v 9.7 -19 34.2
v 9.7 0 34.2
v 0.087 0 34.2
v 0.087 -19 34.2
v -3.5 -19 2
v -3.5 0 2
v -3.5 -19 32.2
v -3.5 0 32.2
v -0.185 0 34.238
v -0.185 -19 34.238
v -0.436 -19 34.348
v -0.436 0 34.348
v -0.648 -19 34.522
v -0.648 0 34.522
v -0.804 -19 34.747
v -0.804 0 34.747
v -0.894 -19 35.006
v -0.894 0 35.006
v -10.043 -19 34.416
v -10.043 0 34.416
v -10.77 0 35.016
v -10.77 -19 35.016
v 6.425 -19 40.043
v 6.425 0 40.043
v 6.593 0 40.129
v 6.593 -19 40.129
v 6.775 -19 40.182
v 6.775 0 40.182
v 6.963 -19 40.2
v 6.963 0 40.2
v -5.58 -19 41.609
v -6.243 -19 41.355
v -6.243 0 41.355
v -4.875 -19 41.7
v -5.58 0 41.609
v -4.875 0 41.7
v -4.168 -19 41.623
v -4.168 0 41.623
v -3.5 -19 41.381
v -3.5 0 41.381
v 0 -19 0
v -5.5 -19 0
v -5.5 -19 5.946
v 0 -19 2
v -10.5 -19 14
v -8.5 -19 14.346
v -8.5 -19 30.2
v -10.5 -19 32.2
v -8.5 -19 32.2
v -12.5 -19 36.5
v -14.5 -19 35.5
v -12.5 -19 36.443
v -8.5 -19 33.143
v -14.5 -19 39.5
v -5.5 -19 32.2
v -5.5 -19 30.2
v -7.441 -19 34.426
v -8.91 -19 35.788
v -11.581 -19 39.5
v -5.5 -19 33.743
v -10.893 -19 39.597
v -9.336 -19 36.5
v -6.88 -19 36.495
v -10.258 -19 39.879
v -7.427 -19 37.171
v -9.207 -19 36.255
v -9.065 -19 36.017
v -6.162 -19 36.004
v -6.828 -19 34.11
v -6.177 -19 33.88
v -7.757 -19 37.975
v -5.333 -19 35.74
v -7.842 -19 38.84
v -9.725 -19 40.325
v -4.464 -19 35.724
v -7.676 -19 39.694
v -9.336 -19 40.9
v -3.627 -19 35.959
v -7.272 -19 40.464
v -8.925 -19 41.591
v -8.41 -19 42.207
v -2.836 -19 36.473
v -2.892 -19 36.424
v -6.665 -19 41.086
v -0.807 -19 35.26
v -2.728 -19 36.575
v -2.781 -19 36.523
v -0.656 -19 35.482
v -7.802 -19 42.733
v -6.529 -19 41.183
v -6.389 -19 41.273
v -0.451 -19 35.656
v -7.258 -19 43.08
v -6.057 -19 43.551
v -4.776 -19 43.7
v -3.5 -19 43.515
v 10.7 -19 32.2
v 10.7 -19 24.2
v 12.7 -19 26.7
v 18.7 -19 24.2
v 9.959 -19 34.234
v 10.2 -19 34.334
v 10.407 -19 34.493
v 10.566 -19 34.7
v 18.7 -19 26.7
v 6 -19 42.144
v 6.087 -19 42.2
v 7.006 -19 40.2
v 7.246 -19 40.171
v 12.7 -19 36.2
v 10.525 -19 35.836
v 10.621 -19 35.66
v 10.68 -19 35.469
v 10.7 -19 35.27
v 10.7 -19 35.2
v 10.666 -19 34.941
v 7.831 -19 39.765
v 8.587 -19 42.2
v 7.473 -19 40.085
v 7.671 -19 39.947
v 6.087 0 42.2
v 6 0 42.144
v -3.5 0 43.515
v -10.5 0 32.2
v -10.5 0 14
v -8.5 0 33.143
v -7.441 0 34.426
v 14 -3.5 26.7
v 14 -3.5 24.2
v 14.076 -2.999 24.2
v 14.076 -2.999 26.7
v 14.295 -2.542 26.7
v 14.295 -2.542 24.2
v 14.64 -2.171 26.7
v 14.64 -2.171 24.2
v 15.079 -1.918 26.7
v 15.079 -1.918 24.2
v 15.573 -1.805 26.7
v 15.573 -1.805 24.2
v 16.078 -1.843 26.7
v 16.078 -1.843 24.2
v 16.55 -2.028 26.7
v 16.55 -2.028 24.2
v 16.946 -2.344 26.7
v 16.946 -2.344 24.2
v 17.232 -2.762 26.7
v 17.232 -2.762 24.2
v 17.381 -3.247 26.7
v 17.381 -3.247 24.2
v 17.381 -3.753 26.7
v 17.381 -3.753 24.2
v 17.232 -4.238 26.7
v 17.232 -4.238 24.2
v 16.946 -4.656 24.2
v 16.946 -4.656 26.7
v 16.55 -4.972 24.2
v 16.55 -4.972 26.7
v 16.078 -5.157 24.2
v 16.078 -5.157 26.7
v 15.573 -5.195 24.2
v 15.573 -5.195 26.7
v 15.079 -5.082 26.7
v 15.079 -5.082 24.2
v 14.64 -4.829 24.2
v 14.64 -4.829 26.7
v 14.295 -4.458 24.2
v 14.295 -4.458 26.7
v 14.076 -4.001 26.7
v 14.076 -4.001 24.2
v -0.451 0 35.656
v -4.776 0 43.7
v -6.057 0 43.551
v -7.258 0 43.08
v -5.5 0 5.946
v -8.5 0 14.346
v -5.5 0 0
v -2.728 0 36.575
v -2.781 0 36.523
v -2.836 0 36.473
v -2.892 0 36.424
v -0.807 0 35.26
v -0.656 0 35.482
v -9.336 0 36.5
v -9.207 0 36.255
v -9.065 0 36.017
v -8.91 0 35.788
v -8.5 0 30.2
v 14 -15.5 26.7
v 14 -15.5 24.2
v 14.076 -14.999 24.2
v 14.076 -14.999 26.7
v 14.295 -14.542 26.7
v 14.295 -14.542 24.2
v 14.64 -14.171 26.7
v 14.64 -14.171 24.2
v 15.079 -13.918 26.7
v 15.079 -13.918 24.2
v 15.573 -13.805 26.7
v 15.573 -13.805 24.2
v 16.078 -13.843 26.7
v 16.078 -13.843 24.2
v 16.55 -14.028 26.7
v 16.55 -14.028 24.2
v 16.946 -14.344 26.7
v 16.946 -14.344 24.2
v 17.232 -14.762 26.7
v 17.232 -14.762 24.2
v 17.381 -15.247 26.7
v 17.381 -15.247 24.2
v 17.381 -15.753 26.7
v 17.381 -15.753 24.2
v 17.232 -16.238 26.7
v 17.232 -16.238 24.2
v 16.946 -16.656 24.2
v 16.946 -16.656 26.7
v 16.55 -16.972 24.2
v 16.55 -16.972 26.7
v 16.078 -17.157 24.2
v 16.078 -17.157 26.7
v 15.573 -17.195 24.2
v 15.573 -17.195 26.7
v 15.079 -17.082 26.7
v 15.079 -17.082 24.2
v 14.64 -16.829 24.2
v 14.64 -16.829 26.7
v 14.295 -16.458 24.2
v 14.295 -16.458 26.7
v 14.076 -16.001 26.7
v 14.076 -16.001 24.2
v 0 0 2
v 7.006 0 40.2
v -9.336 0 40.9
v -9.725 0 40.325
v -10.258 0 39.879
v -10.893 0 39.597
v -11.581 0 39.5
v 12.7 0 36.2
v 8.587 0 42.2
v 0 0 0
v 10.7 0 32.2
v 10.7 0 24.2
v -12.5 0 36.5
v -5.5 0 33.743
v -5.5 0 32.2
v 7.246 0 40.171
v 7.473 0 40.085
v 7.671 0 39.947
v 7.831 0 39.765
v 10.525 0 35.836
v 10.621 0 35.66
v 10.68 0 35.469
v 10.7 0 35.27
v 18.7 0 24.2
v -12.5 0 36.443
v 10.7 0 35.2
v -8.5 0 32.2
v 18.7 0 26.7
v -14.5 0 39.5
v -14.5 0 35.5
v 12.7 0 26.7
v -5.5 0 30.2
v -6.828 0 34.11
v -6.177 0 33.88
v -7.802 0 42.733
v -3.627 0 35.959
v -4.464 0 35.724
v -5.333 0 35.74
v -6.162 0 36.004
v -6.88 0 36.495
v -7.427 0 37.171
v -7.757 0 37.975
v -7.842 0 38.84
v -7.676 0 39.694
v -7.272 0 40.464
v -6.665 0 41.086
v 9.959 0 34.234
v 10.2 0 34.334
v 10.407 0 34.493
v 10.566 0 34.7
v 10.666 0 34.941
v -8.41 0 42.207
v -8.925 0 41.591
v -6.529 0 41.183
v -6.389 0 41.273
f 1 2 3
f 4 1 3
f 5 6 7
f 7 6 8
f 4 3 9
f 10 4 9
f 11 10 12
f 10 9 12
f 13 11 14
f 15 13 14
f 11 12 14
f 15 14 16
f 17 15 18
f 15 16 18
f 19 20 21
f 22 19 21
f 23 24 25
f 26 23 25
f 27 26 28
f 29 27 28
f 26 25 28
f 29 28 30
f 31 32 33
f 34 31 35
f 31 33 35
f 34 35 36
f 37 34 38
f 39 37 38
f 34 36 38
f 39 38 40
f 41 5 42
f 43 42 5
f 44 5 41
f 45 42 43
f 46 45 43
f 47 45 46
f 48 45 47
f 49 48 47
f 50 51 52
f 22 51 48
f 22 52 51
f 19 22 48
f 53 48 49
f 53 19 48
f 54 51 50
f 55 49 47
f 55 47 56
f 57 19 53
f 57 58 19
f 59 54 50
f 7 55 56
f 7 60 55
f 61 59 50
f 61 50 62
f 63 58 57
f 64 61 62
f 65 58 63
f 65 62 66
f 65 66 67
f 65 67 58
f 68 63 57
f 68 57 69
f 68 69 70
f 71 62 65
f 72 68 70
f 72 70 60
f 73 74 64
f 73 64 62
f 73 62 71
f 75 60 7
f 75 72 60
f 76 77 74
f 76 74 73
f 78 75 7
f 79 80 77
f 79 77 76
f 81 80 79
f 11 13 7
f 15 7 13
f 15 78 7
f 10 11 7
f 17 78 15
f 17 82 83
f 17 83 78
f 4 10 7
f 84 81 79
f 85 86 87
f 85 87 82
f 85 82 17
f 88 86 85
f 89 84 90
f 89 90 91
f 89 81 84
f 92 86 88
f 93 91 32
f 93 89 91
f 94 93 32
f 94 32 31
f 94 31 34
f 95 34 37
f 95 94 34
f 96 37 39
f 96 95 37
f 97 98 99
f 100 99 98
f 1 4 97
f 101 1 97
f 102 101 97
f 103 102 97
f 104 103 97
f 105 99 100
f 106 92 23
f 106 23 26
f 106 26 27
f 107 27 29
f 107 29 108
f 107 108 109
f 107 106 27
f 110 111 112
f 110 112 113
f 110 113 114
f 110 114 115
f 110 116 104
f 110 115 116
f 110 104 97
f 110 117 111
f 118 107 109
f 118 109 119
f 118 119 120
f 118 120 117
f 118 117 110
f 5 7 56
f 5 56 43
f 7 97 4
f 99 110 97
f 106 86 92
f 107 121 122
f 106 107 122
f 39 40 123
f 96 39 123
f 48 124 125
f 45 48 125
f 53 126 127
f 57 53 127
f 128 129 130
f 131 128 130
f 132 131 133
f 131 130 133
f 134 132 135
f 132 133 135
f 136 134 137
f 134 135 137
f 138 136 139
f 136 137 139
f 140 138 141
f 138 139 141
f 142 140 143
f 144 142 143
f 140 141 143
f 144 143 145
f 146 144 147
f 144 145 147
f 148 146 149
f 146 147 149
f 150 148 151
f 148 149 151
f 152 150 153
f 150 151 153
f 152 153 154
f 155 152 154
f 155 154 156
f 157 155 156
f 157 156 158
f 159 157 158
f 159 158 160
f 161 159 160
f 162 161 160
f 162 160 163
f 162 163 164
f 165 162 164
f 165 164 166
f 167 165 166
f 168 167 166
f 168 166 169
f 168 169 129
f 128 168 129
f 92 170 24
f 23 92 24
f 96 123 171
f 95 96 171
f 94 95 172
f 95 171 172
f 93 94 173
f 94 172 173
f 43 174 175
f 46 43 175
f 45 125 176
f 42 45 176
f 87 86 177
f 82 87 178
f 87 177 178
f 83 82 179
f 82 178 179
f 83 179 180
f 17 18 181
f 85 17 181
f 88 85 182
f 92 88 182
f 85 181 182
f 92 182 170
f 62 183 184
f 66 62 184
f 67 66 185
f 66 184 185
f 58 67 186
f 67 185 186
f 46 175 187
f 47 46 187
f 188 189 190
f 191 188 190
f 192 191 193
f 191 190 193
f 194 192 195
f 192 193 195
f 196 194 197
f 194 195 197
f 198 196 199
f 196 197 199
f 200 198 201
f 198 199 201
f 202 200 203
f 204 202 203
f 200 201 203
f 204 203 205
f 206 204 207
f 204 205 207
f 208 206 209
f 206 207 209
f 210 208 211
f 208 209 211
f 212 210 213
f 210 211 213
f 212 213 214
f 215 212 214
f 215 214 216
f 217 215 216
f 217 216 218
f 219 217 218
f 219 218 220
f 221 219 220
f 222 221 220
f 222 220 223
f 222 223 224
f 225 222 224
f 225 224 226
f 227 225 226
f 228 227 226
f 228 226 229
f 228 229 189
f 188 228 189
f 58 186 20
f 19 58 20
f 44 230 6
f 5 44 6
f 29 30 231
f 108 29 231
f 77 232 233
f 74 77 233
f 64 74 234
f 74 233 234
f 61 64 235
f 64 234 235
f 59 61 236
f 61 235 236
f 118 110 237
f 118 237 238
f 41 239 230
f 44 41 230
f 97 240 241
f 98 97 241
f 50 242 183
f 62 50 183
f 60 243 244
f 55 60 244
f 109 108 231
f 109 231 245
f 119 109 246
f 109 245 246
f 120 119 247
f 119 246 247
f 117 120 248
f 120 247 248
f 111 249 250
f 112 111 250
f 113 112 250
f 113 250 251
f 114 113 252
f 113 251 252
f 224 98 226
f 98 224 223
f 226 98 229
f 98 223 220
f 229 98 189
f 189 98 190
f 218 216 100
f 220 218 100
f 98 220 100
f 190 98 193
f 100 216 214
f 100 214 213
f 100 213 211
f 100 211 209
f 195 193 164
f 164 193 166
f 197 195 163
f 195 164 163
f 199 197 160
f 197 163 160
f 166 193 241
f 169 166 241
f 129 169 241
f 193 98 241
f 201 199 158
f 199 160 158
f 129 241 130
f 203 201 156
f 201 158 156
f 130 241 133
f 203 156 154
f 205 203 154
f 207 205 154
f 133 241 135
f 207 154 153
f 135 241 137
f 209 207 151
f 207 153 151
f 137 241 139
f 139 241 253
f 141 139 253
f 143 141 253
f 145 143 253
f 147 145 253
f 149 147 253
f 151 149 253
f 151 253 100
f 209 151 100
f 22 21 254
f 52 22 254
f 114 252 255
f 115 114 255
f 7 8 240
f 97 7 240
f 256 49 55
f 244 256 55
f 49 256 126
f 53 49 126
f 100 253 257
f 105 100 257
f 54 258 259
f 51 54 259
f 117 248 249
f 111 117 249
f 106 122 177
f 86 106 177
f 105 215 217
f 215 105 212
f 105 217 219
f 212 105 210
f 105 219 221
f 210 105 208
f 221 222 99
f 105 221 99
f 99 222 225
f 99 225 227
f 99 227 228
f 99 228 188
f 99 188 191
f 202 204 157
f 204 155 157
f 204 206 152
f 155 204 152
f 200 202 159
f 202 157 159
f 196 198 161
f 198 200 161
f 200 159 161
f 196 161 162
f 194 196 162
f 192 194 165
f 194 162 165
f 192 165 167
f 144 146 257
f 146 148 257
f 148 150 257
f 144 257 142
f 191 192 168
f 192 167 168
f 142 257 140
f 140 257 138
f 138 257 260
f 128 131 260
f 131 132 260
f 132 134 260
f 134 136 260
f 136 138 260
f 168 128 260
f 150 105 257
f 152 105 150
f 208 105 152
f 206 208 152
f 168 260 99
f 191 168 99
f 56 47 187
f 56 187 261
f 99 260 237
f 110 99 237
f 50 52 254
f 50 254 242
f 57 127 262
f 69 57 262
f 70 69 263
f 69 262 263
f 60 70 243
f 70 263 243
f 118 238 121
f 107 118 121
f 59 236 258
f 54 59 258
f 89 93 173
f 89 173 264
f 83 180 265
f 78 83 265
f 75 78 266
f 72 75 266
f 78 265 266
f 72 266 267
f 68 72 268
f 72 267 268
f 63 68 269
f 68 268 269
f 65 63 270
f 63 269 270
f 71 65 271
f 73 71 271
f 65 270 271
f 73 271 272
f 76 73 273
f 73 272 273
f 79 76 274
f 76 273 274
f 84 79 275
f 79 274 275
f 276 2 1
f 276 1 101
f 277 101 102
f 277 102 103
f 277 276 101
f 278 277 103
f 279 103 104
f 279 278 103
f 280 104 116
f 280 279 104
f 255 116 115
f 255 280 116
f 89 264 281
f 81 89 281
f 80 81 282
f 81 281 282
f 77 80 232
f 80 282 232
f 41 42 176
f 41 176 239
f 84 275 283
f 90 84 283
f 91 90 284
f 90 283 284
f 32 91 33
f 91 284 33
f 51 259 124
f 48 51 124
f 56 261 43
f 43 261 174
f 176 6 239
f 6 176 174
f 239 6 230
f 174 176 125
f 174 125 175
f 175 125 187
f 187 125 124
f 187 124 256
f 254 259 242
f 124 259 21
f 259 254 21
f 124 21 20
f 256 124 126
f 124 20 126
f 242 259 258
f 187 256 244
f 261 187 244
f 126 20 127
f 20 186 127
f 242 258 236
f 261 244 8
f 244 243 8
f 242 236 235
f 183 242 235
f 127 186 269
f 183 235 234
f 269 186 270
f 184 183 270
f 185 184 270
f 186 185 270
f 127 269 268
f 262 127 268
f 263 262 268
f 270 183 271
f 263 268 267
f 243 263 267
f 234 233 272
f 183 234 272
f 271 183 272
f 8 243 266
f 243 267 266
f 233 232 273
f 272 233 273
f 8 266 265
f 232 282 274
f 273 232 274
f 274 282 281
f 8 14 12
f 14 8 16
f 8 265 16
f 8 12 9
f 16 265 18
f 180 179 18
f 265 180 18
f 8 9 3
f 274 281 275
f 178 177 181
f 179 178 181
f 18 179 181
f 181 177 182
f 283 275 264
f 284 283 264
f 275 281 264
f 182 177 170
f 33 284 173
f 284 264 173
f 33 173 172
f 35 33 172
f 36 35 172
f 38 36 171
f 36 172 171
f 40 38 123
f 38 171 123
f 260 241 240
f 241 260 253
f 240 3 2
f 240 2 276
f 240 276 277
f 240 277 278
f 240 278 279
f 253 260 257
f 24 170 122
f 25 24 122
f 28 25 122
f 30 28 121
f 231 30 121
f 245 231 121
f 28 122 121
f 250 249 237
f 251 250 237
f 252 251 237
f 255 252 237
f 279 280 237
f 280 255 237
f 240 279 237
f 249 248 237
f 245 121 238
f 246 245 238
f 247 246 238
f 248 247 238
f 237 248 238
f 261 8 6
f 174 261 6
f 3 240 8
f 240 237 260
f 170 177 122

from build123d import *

# Parameters (mm, degrees)
F0_W        = 3
F0_H        = 2
F1_DEPTH    = 19
F3_D        = 3.4
F4_T1_DEPTH = 19


# Not quite as in the source:
# - a fillet or chamfer that OpenCascade refuses, or shapes differently, is made with other operations: its cross-section is extruded or revolved along the edge and cut away or added


with BuildPart() as f1:
    # F0 (on Front) → F1 (new body)
    with BuildSketch(Plane.XZ):
        with Locations((-7, 31.2)):
            Rectangle(F0_W, F0_H)
        with BuildLine():
            Line((-10.0427465571, 34.4155443421), (-8.5, 33.1427784325))
            Line((-8.5, 33.1427784325), (-7.441074238, 34.4263248107))
            ThreePointArc((-7.441074238, 34.4263248107), (-8.244619139, 35.032889635), (-8.9103596286, 35.7881345584))
            Line((-8.9103596286, 35.7881345584), (-10.0427465571, 34.4155443421))
        make_face()
        with BuildLine():
            Line((-10.5, 14), (-5.5, 0))
            Line((-5.5, 0), (-5.5, 5.9464274989))
            Line((-5.5, 5.9464274989), (-8.5, 14.3464274989))
            Line((-8.5, 14.3464274989), (-8.5, 30.2))
            Line((-8.5, 30.2), (-8.5, 32.2))
            Line((-8.5, 32.2), (-8.5, 33.1427784325))
            Line((-8.5, 33.1427784325), (-10.0427465571, 34.4155443421))
            Line((-10.0427465571, 34.4155443421), (-10.7699806475, 35.0155124667))
            Line((-10.7699806475, 35.0155124667), (-12.5, 36.4427784325))
            Line((-12.5, 36.4427784325), (-12.5, 36.5))
            Line((-12.5, 36.5), (-9.3357403136, 36.5))
            ThreePointArc((-9.3357403136, 36.5), (-9.7907115521, 37.9601557031), (-9.7830217401, 39.4895328221))
            ThreePointArc((-9.7830217401, 39.4895328221), (-9.7333018776, 39.7544433664), (-9.6693788597, 40.0162897125))
            ThreePointArc((-9.6693788597, 40.0162897125), (-9.5234750406, 40.4660413374), (-9.3357403136, 40.9))
            ThreePointArc((-9.3357403136, 40.9), (-10.2578590901, 39.8786796564), (-11.5807347457, 39.5))
            Line((-11.5807347457, 39.5), (-14.5, 39.5))
            Line((-14.5, 39.5), (-14.5, 35.5))
            Line((-14.5, 35.5), (-10.5, 32.2))
            Line((-10.5, 32.2), (-10.5, 14))
        make_face()
        with BuildLine():
            Line((-4.3254974298, 0), (0, 0))
            Line((0, 0), (0, 2))
            Line((0, 2), (-3.5, 2))
            Line((-3.5, 2), (-3.5, 32.2))
            Line((-3.5, 32.2), (6, 32.2))
            Line((6, 32.2), (10.7, 32.2))
            Line((10.7, 32.2), (10.7, 24.2))
            Line((10.7, 24.2), (18.7, 24.2))
            Line((18.7, 24.2), (18.7, 26.7))
            Line((18.7, 26.7), (12.7, 26.7))
            Line((12.7, 26.7), (12.7, 36.2))
            Line((12.7, 36.2), (8.5871078054, 42.2))
            Line((8.5871078054, 42.2), (6.0871078054, 42.2))
            Line((6.0871078054, 42.2), (6, 42.14441707))
            Line((6, 42.14441707), (-2.7279451008, 36.5751714729))
            ThreePointArc((-2.7279451008, 36.5751714729), (-2.80839002, 36.4979195279), (-2.8916508552, 36.4237111635))
            ThreePointArc((-2.8916508552, 36.4237111635), (-7.1777694161, 36.8127553939), (-6.6645515402, 41.085784196))
            ThreePointArc((-6.6645515402, 41.085784196), (-6.4594906698, 41.2290009349), (-6.2432123403, 41.3546380278))
            ThreePointArc((-6.2432123403, 41.3546380278), (-4.8748228701, 41.6998591388), (-3.5, 41.3812223027))
            Line((-3.5, 41.3812223027), (-3.5, 43.5154909445))
            ThreePointArc((-3.5, 43.5154909445), (-5.4216118426, 43.6667277767), (-7.2576401277, 43.0798165491))
            Line((-7.2576401277, 43.0798165491), (-7.8017760466, 42.7326069212))
            ThreePointArc((-7.8017760466, 42.7326069212), (-8.6798603613, 41.909300368), (-9.3357403136, 40.9))
            ThreePointArc((-9.3357403136, 40.9), (-9.5234750406, 40.4660413374), (-9.6693788597, 40.0162897125))
            ThreePointArc((-9.6693788597, 40.0162897125), (-9.7333018776, 39.7544433664), (-9.7830217401, 39.4895328221))
            ThreePointArc((-9.7830217401, 39.4895328221), (-9.7907115521, 37.9601557031), (-9.3357403136, 36.5))
            ThreePointArc((-9.3357403136, 36.5), (-9.1378337815, 36.1352330993), (-8.9103596286, 35.7881345584))
            ThreePointArc((-8.9103596286, 35.7881345584), (-8.244619139, 35.032889635), (-7.441074238, 34.4263248107))
            ThreePointArc((-7.441074238, 34.4263248107), (-6.506072339, 33.9837160238), (-5.5, 33.7429889213))
            Line((-5.5, 33.7429889213), (-5.5, 32.3898009956))
            Line((-5.5, 32.3898009956), (-5.5, 32.2))
            Line((-5.5, 32.2), (-5.5, 30.2))
            Line((-5.5, 30.2), (-5.5, 5.9464274989))
            Line((-5.5, 5.9464274989), (-5.5, 0))
            Line((-5.5, 0), (-4.3254974298, 0))
        make_face()
        Polygon((-0.9128921946, 34.2), (-0.9128921946, 35.3608666872), (6.6708440859, 40.2), (7.5332950832, 40.2), (10.7, 35.5803239662), (10.7, 34.2), align=None, mode=Mode.SUBTRACT)
    extrude(amount=F1_DEPTH)

    # F3 (through all)
    with Locations(Plane.XY.offset(26.7)):
        with Locations((15.7, -15.5), (15.7, -3.5)):
            Hole(F3_D / 2)

    # F4: fillet of radius 1 on 6 edges, made by hand

    # F4_s2 → F4_t1 (join)
    with BuildSketch(Plane.XZ):
        with BuildLine():
            ThreePointArc((10.5248181897, 35.8358839984), (10.6552010756, 35.5664435563), (10.7, 35.2704859494))
            Line((10.7, 35.2704859494), (10.7, 35.5803239662))
            Line((10.7, 35.5803239662), (10.5248181897, 35.8358839984))
        make_face()
        with BuildLine():
            ThreePointArc((7.0063887221, 40.2), (7.4725442492, 40.0847027888), (7.8312069118, 39.7653980491))
            Line((7.8312069118, 39.7653980491), (7.5332950832, 40.2))
            Line((7.5332950832, 40.2), (7.0063887221, 40.2))
        make_face()
        with BuildLine():
            ThreePointArc((6.4247991527, 40.0430003116), (6.6825339897, 40.1599479964), (6.9627122262, 40.2))
            Line((6.9627122262, 40.2), (6.6708440859, 40.2))
            Line((6.6708440859, 40.2), (6.4247991527, 40.0430003116))
        make_face()
        with BuildLine():
            ThreePointArc((-0.9128921946, 34.8127210695), (-0.7897938633, 35.2933908764), (-0.450805268, 35.6557213811))
            Line((-0.450805268, 35.6557213811), (-0.9128921946, 35.3608666872))
            Line((-0.9128921946, 35.3608666872), (-0.9128921946, 34.8127210695))
        make_face()
        with BuildLine():
            ThreePointArc((0.0871078054, 34.2), (-0.6199989757, 34.4928932188), (-0.9128921946, 35.2))
            Line((-0.9128921946, 35.2), (-0.9128921946, 34.2))
            Line((-0.9128921946, 34.2), (0.0871078054, 34.2))
        make_face()
        with BuildLine():
            ThreePointArc((9.7, 34.2), (10.4071067812, 34.4928932188), (10.7, 35.2))
            Line((10.7, 35.2), (10.7, 34.2))
            Line((10.7, 34.2), (9.7, 34.2))
        make_face()
    extrude(amount=F4_T1_DEPTH)


solid = f1.part
